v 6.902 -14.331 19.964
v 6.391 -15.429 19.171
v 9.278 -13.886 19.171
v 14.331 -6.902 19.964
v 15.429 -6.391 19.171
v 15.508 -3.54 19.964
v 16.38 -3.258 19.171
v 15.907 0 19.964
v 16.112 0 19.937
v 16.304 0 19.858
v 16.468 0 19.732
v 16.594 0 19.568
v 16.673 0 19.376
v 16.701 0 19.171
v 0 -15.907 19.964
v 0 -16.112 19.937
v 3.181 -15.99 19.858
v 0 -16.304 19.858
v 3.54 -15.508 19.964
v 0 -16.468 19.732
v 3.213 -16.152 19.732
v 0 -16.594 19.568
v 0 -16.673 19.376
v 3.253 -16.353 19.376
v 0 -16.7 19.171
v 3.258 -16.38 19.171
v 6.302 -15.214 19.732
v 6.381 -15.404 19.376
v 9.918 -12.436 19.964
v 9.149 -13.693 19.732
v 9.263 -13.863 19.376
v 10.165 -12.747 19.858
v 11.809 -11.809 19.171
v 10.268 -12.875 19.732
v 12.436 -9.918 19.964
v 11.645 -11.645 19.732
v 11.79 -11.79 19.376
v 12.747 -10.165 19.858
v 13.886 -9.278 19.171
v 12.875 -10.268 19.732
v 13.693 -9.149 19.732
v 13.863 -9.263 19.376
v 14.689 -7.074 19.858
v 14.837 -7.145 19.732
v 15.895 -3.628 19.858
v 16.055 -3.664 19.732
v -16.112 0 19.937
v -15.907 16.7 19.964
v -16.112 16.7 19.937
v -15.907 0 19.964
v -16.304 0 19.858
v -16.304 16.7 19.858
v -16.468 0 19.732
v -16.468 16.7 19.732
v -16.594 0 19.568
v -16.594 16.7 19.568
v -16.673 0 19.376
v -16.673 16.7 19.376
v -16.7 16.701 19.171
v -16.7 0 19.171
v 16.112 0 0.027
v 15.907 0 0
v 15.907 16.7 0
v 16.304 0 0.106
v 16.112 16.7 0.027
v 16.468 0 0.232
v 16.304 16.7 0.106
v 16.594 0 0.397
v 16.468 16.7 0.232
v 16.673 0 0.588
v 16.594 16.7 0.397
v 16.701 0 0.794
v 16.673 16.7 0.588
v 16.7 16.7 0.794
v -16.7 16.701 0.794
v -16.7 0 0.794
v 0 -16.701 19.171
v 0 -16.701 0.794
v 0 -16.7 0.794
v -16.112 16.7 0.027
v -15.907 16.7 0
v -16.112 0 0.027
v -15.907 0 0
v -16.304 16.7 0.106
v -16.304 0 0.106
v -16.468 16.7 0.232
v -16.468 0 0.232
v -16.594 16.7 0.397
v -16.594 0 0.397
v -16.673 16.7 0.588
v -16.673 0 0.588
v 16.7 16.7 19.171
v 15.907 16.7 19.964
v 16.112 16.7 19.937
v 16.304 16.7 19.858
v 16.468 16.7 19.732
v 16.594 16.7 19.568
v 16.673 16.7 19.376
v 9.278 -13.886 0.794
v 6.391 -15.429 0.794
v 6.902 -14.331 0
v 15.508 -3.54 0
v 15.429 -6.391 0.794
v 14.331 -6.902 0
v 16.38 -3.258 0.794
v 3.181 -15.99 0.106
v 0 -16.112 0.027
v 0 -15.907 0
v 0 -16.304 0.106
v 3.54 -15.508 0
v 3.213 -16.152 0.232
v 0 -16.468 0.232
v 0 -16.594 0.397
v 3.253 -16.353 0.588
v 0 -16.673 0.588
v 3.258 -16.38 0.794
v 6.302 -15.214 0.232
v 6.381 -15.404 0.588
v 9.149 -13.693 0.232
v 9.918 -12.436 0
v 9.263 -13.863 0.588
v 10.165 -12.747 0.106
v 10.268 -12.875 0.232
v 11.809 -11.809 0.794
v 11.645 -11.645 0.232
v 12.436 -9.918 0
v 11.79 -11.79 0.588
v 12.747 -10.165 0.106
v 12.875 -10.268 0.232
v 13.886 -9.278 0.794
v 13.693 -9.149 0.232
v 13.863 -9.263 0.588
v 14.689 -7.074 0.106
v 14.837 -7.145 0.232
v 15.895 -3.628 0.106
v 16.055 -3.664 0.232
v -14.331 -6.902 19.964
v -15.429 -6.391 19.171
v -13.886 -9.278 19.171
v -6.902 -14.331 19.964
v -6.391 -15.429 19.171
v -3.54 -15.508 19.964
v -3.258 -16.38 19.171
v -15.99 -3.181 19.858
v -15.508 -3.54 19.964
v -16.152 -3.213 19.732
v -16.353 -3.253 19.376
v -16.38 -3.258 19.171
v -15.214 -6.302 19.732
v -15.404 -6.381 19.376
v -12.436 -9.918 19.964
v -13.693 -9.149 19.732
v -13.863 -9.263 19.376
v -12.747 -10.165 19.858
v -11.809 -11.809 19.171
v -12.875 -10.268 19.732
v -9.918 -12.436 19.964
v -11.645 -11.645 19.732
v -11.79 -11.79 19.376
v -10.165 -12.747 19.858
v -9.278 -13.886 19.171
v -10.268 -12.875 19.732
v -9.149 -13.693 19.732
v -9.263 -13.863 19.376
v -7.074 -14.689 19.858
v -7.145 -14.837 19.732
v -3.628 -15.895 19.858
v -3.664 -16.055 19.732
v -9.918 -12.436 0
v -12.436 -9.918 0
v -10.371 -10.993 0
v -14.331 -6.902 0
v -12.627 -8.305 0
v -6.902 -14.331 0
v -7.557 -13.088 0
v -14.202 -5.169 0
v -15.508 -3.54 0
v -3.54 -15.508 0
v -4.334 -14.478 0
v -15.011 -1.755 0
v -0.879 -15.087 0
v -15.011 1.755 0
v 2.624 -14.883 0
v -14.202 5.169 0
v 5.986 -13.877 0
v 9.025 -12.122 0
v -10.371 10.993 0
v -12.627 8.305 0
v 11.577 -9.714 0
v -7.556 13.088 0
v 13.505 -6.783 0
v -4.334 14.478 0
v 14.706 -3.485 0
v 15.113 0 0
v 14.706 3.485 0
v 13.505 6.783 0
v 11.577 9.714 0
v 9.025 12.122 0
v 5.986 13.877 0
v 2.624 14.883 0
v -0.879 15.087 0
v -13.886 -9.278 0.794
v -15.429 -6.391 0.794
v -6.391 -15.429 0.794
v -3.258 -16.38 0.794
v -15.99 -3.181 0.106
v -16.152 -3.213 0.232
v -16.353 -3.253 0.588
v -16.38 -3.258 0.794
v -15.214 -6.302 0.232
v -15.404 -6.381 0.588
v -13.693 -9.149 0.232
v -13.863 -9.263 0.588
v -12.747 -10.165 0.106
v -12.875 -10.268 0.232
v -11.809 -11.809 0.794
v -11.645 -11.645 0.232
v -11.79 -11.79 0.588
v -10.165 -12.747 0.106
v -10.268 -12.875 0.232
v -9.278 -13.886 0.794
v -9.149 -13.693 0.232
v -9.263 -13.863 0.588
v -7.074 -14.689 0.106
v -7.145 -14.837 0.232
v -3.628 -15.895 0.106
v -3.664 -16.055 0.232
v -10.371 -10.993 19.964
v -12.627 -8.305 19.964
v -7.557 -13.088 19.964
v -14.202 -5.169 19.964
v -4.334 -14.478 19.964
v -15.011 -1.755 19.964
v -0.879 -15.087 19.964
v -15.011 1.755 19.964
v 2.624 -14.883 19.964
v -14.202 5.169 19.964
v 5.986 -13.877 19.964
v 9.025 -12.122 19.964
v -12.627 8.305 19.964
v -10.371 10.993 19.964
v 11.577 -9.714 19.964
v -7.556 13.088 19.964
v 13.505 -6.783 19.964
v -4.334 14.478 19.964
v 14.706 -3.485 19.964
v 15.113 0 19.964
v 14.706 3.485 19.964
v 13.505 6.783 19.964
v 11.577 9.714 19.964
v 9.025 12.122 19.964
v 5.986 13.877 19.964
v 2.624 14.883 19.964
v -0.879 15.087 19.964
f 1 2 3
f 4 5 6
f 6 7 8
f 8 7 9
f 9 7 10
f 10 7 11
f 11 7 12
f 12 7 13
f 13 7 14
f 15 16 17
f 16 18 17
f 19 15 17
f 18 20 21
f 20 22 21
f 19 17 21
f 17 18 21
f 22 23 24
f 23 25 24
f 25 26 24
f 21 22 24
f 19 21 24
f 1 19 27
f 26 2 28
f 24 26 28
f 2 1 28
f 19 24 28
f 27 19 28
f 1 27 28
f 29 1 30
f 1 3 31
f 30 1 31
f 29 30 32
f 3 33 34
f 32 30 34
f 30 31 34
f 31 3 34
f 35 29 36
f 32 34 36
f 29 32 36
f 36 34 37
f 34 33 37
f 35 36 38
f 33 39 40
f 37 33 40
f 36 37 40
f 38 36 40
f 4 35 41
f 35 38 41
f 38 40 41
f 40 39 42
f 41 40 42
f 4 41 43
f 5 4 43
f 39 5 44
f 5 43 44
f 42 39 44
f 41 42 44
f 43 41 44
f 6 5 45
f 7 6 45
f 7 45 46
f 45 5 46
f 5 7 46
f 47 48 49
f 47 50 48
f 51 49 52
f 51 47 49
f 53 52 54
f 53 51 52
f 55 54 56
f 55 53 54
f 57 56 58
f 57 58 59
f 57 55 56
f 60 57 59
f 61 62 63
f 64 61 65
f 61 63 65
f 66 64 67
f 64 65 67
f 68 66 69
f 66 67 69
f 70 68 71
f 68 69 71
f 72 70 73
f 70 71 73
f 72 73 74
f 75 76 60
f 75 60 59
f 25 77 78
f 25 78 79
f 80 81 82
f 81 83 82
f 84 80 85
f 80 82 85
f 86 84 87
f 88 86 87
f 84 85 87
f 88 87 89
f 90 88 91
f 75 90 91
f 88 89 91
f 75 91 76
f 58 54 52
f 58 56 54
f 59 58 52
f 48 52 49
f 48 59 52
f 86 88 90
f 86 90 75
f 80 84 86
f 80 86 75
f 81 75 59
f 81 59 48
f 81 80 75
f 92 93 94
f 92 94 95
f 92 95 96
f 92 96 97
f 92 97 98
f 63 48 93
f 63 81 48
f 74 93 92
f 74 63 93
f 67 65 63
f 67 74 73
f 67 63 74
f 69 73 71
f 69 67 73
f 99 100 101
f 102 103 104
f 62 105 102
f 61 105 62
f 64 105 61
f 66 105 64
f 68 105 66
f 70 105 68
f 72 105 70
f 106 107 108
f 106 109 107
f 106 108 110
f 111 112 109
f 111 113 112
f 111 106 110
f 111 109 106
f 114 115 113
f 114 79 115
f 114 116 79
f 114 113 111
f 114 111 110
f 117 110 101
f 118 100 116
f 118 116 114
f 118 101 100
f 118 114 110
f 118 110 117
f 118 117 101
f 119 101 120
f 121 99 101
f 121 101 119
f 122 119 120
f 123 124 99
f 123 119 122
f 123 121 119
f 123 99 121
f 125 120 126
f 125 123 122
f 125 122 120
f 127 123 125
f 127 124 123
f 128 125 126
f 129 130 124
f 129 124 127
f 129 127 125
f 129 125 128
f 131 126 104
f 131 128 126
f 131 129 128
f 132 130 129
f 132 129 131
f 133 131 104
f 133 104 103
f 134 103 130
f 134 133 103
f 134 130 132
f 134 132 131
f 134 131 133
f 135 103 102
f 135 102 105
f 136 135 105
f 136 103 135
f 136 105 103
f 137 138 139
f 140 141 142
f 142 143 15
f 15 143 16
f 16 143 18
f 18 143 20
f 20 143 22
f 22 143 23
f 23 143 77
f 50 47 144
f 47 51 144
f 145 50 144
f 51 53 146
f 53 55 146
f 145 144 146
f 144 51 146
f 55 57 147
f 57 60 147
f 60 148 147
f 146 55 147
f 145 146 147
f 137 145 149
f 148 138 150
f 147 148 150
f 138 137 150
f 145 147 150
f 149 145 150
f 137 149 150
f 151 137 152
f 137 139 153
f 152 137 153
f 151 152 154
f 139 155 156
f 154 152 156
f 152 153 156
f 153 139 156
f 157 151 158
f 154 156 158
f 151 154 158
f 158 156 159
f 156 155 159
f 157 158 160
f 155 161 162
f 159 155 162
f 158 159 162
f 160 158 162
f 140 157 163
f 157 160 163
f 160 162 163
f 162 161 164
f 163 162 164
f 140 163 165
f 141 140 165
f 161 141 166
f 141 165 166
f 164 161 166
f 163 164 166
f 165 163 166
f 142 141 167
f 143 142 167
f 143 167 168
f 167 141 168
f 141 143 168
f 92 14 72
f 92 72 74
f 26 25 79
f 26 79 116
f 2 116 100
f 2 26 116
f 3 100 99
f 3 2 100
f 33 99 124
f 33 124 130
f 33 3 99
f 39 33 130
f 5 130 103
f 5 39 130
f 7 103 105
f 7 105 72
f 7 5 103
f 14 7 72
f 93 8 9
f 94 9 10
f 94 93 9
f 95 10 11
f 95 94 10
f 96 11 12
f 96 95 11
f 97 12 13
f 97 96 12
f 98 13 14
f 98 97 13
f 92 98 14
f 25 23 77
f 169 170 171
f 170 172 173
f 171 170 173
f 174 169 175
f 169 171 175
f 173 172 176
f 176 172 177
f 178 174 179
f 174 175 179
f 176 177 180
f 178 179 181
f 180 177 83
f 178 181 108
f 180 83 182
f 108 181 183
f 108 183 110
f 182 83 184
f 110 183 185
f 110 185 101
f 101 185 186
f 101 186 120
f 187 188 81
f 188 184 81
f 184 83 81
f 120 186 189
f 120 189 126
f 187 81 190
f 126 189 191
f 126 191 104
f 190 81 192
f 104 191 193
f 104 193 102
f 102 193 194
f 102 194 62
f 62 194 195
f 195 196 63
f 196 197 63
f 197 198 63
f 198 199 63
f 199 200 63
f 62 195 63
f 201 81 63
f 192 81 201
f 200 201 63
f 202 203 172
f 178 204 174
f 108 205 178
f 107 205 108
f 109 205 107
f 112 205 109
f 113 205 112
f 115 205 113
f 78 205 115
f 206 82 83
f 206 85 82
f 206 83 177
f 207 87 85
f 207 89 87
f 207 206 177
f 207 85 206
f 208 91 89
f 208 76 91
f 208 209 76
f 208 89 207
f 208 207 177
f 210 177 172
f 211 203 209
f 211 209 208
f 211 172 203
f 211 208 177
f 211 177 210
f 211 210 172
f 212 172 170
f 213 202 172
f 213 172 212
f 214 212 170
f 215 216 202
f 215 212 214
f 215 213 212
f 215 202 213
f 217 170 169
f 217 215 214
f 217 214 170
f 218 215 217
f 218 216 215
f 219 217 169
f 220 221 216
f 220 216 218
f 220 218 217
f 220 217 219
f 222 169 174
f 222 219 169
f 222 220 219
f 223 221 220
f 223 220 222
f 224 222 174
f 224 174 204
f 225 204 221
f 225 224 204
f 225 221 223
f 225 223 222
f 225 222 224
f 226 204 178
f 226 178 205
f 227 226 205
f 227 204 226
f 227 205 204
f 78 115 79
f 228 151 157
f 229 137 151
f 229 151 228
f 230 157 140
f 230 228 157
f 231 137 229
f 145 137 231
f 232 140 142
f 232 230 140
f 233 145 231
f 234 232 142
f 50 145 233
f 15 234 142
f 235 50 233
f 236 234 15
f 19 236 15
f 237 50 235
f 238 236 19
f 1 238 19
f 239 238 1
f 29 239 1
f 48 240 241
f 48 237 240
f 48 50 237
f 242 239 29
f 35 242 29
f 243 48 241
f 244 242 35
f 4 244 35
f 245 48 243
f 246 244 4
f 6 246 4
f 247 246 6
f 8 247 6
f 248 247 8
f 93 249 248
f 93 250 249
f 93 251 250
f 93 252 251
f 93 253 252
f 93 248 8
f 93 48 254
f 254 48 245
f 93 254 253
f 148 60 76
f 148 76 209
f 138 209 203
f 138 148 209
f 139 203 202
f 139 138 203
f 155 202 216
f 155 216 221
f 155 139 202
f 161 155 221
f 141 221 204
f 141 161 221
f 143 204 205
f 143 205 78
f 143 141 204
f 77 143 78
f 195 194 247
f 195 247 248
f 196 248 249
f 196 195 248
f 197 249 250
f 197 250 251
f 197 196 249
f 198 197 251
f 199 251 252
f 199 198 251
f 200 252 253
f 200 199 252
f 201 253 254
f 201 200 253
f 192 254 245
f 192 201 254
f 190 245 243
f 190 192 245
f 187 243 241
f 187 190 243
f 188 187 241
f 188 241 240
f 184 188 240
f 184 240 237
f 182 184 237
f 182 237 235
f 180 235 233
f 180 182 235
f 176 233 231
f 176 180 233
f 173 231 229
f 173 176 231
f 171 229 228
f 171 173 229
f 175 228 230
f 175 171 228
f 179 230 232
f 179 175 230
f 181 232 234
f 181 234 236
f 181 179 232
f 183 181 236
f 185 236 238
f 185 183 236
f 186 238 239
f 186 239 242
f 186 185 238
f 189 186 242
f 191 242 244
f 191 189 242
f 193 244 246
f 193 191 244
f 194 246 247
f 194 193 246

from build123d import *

# Parameters (mm, degrees)
F0_W     = 33.401
F0_H     = 33.401
F0_R     = 15.113
F1_DEPTH = 19.9644
F2_R     = 16.70049
F3_R     = 0.79375


# Not quite as in the source:
# - a fillet or chamfer is up to 0.001 mm smaller than in the source, because OpenCascade refuses the exact size


with BuildPart() as f1:
    # F0 (on Top) → F1 (new body)
    with BuildSketch(Plane.XY):
        Rectangle(F0_W, F0_H)
        Circle(F0_R, mode=Mode.SUBTRACT)
    extrude(amount=F1_DEPTH)

    # F2 (radius 16.7005 in the source; OpenCascade refuses exactly that, so slightly less here)
    f2_edges = [f1.edges().sort_by_distance(p)[0] for p in [
        (-16.7005, -16.7005, 9.9822),
        (16.7005, -16.7005, 9.9822),
    ]]
    fillet(f2_edges, radius=F2_R)

    # F3
    f3_edges = [f1.edges().sort_by_distance(p)[0] for p in [
        (11.80904, -11.80904, 19.9644),
        (11.80904, -11.80904, 0),
    ]]
    fillet(f3_edges, radius=F3_R)


solid = f1.part
